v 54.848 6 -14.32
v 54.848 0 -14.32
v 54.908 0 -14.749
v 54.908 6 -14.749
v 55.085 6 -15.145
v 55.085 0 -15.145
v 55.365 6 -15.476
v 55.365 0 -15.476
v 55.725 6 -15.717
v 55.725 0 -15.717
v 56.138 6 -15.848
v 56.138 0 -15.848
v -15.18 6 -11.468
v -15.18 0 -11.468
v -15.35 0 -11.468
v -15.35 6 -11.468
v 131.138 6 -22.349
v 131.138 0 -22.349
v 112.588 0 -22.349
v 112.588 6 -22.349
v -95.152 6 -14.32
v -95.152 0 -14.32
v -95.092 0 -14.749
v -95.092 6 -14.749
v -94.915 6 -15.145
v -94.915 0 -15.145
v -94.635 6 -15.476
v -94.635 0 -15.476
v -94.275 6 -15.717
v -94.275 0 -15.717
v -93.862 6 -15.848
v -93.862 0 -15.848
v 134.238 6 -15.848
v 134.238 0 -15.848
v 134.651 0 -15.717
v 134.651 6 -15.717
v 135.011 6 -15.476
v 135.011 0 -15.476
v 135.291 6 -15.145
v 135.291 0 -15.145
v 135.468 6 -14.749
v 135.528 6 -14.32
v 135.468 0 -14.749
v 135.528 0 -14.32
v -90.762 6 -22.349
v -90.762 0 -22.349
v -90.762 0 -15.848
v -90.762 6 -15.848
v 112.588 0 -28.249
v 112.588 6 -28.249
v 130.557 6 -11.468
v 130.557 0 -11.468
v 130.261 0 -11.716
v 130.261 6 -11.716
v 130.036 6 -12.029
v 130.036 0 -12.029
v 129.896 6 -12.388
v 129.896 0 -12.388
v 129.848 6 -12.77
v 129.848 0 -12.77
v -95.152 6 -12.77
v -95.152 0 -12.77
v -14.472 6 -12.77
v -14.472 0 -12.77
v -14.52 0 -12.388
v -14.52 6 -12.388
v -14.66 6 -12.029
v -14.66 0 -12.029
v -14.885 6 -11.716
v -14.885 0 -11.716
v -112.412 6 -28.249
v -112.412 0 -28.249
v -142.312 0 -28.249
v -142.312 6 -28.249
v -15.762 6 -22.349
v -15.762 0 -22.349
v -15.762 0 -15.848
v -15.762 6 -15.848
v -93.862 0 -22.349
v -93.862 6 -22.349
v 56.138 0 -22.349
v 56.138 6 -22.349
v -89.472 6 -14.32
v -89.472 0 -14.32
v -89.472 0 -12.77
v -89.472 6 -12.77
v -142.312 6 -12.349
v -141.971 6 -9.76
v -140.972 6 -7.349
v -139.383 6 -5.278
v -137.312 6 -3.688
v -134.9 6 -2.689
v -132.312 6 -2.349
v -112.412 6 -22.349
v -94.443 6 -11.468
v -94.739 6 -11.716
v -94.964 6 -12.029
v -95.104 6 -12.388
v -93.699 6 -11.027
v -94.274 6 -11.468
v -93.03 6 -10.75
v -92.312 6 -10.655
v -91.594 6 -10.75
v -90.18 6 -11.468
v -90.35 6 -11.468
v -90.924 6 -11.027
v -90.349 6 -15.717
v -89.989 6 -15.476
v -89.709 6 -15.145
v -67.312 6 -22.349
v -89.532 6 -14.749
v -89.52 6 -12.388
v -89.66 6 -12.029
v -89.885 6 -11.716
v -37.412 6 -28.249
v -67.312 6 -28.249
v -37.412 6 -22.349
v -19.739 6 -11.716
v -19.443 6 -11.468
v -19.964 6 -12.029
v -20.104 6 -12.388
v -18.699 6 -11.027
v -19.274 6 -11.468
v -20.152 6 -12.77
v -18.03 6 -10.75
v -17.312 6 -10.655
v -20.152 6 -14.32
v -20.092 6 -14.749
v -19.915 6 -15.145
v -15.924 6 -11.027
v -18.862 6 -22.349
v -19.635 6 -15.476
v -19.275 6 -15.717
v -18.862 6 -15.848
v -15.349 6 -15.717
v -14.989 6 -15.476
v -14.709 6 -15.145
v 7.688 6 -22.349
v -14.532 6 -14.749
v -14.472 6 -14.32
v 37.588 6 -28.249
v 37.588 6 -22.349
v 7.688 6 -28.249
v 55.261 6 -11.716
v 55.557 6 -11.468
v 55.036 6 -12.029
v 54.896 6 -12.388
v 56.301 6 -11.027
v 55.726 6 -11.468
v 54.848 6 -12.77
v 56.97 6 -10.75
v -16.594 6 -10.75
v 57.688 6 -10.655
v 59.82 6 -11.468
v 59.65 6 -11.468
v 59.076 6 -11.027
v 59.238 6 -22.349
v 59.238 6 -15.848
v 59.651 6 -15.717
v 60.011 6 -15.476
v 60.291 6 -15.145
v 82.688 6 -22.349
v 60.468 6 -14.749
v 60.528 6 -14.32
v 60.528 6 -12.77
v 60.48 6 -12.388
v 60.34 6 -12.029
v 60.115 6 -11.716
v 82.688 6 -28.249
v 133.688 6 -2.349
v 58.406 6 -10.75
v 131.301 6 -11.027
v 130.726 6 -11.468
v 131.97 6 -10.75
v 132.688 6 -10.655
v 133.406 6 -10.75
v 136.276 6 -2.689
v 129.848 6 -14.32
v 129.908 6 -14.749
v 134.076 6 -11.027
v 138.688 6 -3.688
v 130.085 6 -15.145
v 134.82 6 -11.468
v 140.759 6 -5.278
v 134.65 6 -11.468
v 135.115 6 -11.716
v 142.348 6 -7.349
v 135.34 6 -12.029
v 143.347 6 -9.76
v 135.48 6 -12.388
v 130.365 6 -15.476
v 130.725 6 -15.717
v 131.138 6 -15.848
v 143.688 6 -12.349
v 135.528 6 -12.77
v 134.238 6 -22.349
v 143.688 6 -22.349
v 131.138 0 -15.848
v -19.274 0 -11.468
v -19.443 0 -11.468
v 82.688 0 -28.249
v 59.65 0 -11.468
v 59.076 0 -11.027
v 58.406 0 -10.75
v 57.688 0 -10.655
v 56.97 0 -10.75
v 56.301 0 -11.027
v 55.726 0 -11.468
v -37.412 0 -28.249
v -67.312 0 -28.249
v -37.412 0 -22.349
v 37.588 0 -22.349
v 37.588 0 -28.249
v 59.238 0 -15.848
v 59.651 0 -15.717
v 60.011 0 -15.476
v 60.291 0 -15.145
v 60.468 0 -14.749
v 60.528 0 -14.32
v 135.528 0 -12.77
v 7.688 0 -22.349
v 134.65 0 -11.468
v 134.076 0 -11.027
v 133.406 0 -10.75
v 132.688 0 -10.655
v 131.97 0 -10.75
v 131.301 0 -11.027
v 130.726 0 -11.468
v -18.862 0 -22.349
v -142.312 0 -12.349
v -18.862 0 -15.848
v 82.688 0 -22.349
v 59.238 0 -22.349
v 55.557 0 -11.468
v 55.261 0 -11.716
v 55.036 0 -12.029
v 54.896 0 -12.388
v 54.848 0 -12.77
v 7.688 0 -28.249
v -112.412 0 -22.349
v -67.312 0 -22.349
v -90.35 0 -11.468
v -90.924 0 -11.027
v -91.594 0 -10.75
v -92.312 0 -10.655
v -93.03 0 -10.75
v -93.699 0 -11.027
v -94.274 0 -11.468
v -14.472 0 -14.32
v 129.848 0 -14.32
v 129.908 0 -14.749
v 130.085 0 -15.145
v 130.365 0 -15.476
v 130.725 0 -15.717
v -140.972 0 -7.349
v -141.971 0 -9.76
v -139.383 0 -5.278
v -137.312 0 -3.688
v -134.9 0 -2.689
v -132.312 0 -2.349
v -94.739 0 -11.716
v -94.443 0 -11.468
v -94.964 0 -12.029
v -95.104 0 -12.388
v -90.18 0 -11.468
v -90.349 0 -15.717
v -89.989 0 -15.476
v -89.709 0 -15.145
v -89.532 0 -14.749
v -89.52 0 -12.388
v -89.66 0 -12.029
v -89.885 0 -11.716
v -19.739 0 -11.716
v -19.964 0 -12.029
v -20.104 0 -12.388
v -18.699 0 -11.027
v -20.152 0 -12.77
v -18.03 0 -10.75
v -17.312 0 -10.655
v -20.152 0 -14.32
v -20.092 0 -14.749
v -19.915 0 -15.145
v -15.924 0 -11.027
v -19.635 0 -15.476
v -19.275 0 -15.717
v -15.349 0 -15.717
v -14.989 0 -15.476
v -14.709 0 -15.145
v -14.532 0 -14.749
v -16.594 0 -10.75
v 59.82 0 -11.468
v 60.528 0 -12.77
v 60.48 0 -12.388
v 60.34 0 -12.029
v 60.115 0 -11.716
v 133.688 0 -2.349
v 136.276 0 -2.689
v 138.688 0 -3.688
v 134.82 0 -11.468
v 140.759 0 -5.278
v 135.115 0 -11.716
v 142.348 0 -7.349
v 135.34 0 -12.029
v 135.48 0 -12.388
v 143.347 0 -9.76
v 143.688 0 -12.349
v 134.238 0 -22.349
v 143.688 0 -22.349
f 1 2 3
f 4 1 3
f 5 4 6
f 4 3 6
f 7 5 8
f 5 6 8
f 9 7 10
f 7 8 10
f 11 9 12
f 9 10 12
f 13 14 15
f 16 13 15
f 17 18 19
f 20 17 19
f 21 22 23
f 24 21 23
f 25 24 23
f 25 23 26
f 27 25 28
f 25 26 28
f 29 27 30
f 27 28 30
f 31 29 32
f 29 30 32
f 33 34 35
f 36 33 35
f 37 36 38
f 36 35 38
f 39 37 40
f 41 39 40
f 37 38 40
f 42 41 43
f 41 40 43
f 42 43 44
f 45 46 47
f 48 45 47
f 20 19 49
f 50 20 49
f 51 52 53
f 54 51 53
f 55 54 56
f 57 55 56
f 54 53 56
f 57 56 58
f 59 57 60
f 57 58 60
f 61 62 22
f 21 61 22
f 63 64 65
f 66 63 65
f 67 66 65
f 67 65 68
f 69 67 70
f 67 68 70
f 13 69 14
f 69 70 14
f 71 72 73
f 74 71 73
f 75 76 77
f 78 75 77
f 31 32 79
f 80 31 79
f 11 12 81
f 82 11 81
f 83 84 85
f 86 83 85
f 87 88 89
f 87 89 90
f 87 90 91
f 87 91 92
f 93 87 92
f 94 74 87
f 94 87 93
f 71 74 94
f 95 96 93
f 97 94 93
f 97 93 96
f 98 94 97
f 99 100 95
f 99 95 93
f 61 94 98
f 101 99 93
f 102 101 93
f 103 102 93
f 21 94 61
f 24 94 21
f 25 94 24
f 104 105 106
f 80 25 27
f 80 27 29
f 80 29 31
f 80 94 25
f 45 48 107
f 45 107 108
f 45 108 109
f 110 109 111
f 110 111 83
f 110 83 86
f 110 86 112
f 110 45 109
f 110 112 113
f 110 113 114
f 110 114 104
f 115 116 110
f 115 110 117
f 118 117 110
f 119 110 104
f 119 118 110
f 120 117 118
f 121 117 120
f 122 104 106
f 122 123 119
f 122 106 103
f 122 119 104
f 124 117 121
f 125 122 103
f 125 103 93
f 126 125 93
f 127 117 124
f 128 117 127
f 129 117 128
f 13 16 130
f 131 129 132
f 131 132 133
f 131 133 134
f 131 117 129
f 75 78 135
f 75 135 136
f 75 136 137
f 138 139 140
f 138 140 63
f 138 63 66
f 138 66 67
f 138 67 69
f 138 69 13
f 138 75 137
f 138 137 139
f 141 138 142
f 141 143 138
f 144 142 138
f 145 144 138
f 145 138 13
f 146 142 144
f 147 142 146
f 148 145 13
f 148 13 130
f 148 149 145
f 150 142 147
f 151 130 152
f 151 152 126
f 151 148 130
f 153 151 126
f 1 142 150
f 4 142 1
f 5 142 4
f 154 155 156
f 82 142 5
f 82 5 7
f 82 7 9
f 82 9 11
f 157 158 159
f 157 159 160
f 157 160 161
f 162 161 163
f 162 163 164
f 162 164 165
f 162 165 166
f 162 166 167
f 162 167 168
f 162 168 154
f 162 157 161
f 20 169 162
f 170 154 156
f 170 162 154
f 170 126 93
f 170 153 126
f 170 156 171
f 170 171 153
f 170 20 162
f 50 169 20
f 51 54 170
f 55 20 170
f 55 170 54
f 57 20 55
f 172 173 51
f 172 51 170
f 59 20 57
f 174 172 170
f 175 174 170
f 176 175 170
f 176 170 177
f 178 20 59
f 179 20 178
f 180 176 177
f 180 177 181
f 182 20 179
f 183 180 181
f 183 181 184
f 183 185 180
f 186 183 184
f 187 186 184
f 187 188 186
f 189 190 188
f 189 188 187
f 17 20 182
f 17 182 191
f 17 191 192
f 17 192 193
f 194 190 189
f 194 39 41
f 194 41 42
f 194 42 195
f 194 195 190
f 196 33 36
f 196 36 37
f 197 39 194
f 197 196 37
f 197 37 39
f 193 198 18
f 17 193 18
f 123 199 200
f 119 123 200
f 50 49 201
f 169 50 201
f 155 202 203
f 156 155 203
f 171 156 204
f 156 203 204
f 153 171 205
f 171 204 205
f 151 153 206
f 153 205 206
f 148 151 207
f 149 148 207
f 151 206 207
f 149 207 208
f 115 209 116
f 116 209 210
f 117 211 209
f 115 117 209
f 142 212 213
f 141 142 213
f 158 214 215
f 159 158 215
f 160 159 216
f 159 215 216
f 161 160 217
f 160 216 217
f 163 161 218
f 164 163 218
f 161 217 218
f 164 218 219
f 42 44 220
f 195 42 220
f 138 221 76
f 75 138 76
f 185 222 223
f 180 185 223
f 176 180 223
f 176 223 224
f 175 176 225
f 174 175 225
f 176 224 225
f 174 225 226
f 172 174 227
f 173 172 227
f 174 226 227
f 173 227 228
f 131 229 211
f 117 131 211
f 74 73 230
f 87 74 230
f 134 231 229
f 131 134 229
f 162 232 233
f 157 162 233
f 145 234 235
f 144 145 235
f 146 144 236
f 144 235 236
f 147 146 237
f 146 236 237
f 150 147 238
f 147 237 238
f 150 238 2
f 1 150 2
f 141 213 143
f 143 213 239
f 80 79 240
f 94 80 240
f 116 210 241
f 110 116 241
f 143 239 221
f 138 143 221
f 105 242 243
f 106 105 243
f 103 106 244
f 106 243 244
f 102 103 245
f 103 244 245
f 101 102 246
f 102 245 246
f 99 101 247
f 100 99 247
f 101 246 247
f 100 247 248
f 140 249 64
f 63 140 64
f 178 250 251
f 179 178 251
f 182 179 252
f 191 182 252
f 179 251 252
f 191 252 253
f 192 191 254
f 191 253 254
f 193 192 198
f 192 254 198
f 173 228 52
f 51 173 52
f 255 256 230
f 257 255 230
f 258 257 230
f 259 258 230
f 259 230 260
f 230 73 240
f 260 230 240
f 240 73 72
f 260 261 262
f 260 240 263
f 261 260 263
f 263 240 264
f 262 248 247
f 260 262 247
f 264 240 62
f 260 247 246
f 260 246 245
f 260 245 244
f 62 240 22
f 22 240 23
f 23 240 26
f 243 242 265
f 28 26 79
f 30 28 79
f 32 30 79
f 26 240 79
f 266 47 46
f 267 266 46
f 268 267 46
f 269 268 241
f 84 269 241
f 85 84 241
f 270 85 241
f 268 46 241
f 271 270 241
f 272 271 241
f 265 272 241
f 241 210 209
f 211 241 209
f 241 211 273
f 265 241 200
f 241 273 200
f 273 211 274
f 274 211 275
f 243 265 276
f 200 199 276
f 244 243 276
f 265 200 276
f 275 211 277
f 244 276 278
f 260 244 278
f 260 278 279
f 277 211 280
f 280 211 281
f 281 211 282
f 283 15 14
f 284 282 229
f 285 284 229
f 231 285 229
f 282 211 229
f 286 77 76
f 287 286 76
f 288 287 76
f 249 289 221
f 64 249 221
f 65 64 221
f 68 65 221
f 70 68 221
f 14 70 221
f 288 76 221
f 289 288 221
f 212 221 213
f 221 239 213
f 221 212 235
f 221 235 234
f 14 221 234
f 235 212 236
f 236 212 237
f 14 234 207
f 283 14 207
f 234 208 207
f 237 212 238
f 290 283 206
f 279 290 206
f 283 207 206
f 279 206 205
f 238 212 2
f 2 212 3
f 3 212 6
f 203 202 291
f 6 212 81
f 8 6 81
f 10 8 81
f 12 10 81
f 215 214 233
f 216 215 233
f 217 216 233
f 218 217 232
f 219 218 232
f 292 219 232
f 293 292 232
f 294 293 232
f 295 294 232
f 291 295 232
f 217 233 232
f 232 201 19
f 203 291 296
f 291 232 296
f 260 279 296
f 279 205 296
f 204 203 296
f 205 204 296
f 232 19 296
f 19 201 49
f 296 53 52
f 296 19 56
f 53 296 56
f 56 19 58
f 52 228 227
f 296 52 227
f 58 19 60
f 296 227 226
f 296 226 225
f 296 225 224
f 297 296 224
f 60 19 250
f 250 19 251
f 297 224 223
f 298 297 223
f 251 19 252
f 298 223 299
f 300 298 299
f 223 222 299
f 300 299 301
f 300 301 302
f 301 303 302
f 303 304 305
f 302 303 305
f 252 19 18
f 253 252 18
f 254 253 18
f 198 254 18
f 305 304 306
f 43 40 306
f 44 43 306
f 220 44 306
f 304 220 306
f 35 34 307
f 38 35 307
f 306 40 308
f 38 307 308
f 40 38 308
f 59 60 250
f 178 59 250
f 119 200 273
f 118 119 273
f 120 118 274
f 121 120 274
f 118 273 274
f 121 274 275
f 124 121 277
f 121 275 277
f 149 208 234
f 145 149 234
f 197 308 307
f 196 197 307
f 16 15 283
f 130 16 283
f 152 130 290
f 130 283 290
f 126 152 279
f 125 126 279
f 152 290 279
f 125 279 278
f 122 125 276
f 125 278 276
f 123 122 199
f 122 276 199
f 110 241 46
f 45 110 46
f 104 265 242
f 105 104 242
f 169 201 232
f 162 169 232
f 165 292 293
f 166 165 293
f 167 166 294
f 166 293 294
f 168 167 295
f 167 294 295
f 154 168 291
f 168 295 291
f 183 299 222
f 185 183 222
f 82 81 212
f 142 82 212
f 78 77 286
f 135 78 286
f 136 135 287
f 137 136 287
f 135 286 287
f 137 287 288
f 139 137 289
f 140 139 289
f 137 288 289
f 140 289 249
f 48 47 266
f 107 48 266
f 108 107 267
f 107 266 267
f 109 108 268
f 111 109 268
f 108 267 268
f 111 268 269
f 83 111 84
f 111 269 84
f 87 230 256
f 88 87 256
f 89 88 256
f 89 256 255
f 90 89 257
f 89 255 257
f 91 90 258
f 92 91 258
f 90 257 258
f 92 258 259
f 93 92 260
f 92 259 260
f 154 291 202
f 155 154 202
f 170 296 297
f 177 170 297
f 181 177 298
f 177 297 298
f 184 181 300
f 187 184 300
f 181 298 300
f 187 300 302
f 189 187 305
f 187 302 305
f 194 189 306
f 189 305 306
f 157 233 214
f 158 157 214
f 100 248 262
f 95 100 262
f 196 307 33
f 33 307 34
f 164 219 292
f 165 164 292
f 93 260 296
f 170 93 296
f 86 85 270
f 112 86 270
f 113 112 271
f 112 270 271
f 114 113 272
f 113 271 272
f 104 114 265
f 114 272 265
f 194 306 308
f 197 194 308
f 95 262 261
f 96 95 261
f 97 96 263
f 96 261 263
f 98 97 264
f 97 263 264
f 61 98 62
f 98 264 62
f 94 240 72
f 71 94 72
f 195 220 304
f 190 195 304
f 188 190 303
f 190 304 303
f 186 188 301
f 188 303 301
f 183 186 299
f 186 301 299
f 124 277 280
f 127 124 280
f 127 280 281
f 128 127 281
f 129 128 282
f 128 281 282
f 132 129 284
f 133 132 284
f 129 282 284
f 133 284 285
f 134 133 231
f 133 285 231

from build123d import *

# Parameters (mm, degrees)
SALIENTE_EXTRUIR1_DEPTH = 6


with BuildPart() as part:
    # Croquis1 → Saliente-Extruir1 (new body)
    with BuildSketch(Plane(origin=(0, 0, 0), x_dir=(1, 0, 0), z_dir=(0, 1, 0))):
        with BuildLine():
            ThreePointArc((-95.152264236, 14.320303243), (-94.78653124, 15.320309075), (-93.861926606, 15.848398611))
            Line((-93.861926606, 15.848398611), (-93.861926606, 22.348623853))
            Line((-93.861926606, 22.348623853), (-112.411926606, 22.348623853))
            Line((-112.411926606, 22.348623853), (-112.411926606, 28.248623853))
            Line((-112.411926606, 28.248623853), (-142.311926606, 28.248623853))
            Line((-142.311926606, 28.248623853), (-142.311926606, 22.348623853))
            Line((-142.311926606, 22.348623853), (-142.311926606, 12.348623853))
            ThreePointArc((-142.311926606, 12.348623853), (-139.382994417, 5.277556041), (-132.311926606, 2.348623853))
            Line((-132.311926606, 2.348623853), (127.688073394, 2.348623853))
            Line((127.688073394, 2.348623853), (133.688073394, 2.348623853))
            ThreePointArc((133.688073394, 2.348623853), (140.759141206, 5.277556041), (143.688073394, 12.348623853))
            Line((143.688073394, 12.348623853), (143.688073394, 22.348623853))
            Line((143.688073394, 22.348623853), (137.688073394, 22.348623853))
            Line((137.688073394, 22.348623853), (134.238073394, 22.348623853))
            Line((134.238073394, 22.348623853), (134.238073394, 15.848398611))
            ThreePointArc((134.238073394, 15.848398611), (135.162678029, 15.320309075), (135.528411025, 14.320303243))
            Line((135.528411025, 14.320303243), (135.528411025, 12.770303243))
            ThreePointArc((135.528411025, 12.770303243), (135.339714195, 12.029119271), (134.819567568, 11.468398611))
            Line((134.819567568, 11.468398611), (134.650322636, 11.468398611))
            ThreePointArc((134.650322636, 11.468398611), (132.688073394, 10.655388626), (130.725824153, 11.468398611))
            Line((130.725824153, 11.468398611), (130.556579221, 11.468398611))
            ThreePointArc((130.556579221, 11.468398611), (130.036432594, 12.029119271), (129.847735764, 12.770303243))
            Line((129.847735764, 12.770303243), (129.847735764, 14.320303243))
            ThreePointArc((129.847735764, 14.320303243), (130.21346876, 15.320309075), (131.138073394, 15.848398611))
            Line((131.138073394, 15.848398611), (131.138073394, 22.348623853))
            Line((131.138073394, 22.348623853), (112.588073394, 22.348623853))
            Line((112.588073394, 22.348623853), (112.588073394, 28.248623853))
            Line((112.588073394, 28.248623853), (82.688073394, 28.248623853))
            Line((82.688073394, 28.248623853), (82.688073394, 22.348623853))
            Line((82.688073394, 22.348623853), (59.238073394, 22.348623853))
            Line((59.238073394, 22.348623853), (59.238073394, 15.848398611))
            ThreePointArc((59.238073394, 15.848398611), (60.162678029, 15.320309075), (60.528411025, 14.320303243))
            Line((60.528411025, 14.320303243), (60.528411025, 12.770303243))
            ThreePointArc((60.528411025, 12.770303243), (60.339714195, 12.029119271), (59.819567568, 11.468398611))
            Line((59.819567568, 11.468398611), (59.650322636, 11.468398611))
            ThreePointArc((59.650322636, 11.468398611), (57.688073394, 10.655388626), (55.725824153, 11.468398611))
            Line((55.725824153, 11.468398611), (55.556579221, 11.468398611))
            ThreePointArc((55.556579221, 11.468398611), (55.036432594, 12.029119271), (54.847735764, 12.770303243))
            Line((54.847735764, 12.770303243), (54.847735764, 14.320303243))
            ThreePointArc((54.847735764, 14.320303243), (55.21346876, 15.320309075), (56.138073394, 15.848398611))
            Line((56.138073394, 15.848398611), (56.138073394, 22.348623853))
            Line((56.138073394, 22.348623853), (37.588073394, 22.348623853))
            Line((37.588073394, 22.348623853), (37.588073394, 28.248623853))
            Line((37.588073394, 28.248623853), (7.688073394, 28.248623853))
            Line((7.688073394, 28.248623853), (7.688073394, 22.348623853))
            Line((7.688073394, 22.348623853), (-15.761926606, 22.348623853))
            Line((-15.761926606, 22.348623853), (-15.761926606, 15.848398611))
            ThreePointArc((-15.761926606, 15.848398611), (-14.837321971, 15.320309075), (-14.471588975, 14.320303243))
            Line((-14.471588975, 14.320303243), (-14.471588975, 12.770303243))
            ThreePointArc((-14.471588975, 12.770303243), (-14.660285805, 12.029119271), (-15.180432432, 11.468398611))
            Line((-15.180432432, 11.468398611), (-15.349677364, 11.468398611))
            ThreePointArc((-15.349677364, 11.468398611), (-17.311926606, 10.655388626), (-19.274175847, 11.468398611))
            Line((-19.274175847, 11.468398611), (-19.443420779, 11.468398611))
            ThreePointArc((-19.443420779, 11.468398611), (-19.963567406, 12.029119271), (-20.152264236, 12.770303243))
            Line((-20.152264236, 12.770303243), (-20.152264236, 14.320303243))
            ThreePointArc((-20.152264236, 14.320303243), (-19.78653124, 15.320309075), (-18.861926606, 15.848398611))
            Line((-18.861926606, 15.848398611), (-18.861926606, 22.348623853))
            Line((-18.861926606, 22.348623853), (-37.411926606, 22.348623853))
            Line((-37.411926606, 22.348623853), (-37.411926606, 28.248623853))
            Line((-37.411926606, 28.248623853), (-67.311926606, 28.248623853))
            Line((-67.311926606, 28.248623853), (-67.311926606, 22.348623853))
            Line((-67.311926606, 22.348623853), (-90.761926606, 22.348623853))
            Line((-90.761926606, 22.348623853), (-90.761926606, 15.848398611))
            ThreePointArc((-90.761926606, 15.848398611), (-89.837321971, 15.320309075), (-89.471588975, 14.320303243))
            Line((-89.471588975, 14.320303243), (-89.471588975, 12.770303243))
            ThreePointArc((-89.471588975, 12.770303243), (-89.660285805, 12.029119271), (-90.180432432, 11.468398611))
            Line((-90.180432432, 11.468398611), (-90.349677364, 11.468398611))
            ThreePointArc((-90.349677364, 11.468398611), (-92.311926606, 10.655388626), (-94.274175847, 11.468398611))
            Line((-94.274175847, 11.468398611), (-94.443420779, 11.468398611))
            ThreePointArc((-94.443420779, 11.468398611), (-94.963567406, 12.029119271), (-95.152264236, 12.770303243))
            Line((-95.152264236, 12.770303243), (-95.152264236, 14.320303243))
        make_face()
    extrude(amount=SALIENTE_EXTRUIR1_DEPTH)


solid = part.part
